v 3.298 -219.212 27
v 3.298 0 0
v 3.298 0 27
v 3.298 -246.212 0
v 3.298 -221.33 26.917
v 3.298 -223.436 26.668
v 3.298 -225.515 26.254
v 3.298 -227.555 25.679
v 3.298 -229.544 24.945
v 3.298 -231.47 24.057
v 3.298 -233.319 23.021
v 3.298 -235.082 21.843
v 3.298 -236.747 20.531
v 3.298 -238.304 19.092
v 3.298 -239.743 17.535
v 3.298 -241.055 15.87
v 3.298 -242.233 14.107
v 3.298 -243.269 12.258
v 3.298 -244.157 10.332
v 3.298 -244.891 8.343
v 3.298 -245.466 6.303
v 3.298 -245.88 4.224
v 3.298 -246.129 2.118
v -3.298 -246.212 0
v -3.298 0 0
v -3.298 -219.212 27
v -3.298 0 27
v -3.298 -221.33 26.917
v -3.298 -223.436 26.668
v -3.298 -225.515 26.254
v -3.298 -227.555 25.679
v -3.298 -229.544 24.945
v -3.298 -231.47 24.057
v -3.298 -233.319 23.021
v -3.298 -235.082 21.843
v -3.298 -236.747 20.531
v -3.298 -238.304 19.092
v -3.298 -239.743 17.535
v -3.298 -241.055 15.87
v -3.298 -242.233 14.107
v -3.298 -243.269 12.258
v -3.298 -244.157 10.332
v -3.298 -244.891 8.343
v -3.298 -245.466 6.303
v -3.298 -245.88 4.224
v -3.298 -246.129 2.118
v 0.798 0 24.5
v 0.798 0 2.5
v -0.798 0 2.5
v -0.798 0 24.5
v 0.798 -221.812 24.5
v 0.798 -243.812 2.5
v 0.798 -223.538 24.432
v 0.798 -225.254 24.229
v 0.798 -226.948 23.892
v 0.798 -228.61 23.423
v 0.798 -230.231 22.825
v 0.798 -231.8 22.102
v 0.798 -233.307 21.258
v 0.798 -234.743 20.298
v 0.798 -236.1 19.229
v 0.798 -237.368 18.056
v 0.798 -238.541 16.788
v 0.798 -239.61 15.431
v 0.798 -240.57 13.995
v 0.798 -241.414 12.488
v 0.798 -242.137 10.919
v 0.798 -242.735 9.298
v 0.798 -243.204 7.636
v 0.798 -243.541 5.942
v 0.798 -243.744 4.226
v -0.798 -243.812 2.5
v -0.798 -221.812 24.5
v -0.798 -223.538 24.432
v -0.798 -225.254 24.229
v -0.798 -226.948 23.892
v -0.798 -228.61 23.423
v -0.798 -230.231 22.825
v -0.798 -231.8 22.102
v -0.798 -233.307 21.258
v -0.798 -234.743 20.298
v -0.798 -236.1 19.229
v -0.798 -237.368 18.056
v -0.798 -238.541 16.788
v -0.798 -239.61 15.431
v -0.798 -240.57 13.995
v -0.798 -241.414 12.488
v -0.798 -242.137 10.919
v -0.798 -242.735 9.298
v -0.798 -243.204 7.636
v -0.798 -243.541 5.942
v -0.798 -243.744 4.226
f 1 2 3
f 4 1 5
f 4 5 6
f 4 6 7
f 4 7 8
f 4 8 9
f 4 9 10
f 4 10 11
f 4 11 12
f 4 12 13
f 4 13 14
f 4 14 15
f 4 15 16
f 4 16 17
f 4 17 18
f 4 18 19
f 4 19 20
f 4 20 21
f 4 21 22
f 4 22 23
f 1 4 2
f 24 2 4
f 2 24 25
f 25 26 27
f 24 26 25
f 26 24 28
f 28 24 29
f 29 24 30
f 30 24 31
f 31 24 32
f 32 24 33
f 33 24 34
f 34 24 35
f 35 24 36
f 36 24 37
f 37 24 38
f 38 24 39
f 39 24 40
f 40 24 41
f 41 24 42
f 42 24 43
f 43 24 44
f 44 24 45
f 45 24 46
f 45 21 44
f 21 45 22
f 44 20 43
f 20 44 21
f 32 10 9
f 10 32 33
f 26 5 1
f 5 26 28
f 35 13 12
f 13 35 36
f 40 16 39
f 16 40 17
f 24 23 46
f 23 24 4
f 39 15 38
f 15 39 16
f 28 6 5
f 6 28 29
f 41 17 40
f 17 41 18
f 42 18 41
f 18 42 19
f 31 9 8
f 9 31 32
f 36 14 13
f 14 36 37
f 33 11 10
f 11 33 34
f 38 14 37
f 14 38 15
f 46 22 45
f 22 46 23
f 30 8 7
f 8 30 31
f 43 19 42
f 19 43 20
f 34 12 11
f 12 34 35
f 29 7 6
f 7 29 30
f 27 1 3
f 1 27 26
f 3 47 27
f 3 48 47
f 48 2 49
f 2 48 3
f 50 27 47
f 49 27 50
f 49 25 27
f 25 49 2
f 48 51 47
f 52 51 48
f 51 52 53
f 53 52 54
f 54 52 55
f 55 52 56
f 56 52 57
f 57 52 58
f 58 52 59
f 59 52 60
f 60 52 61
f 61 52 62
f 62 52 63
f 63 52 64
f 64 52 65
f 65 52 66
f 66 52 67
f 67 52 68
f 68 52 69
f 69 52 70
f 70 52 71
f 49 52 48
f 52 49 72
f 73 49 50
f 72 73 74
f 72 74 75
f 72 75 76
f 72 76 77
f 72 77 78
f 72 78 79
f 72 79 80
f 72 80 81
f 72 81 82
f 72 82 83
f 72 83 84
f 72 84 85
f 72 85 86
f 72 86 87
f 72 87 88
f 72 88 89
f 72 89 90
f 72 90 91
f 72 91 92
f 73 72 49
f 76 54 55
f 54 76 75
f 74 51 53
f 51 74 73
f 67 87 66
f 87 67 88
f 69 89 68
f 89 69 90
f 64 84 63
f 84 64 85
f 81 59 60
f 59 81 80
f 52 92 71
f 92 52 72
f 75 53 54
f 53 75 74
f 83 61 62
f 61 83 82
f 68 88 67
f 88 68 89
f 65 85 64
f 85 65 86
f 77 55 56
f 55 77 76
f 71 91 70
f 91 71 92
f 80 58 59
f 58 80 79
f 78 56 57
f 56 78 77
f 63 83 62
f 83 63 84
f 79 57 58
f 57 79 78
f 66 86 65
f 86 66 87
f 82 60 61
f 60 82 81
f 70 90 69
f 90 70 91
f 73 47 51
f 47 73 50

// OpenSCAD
// parametric knife sheath
// original by Steve Pendergrast (vorpal)
// https://www.thingiverse.com/thing:125109
//
// remix v5.05 by BikeCyclist: Output rotated by 180 degrees to work around a suspected display bug in Thingiverse customizer - https://www.thingiverse.com/thing:4418138
// remix v5.04 by BikeCyclist: Default grip cutoff angle changed to something Thingiverse customizer can handle - https://www.thingiverse.com/thing:4418138
// remix v5.01 by BikeCyclist: Now supports negative grip cutoff angles 
// remix v4 by BikeCyclist: Bugfix for better walls with windows at high grip cutoff angles
// remix v3 by BikeCyclist: Bugfix (windows in thick walls) as suggested by Laurie, improved use of thingiverse customizer interface, better walls with windows at high grip cutoff angles
// remix v2 by BikeCyclist: Parametric wall thickness, shorter ridges, better symmetry
// remix v1 by BikeCyclist: Introducing holding ridge and oblique cut-off at grip
// https://www.thingiverse.com/thing:2856699

// length: the length of the blade from handle to tip
// maxwidth: the maximum width of the blade
// tipwidth:  the width near the tip, zero means it comes to a point
// thickness: maximum thickness of the blade
// has_windows:  0 = do not put in windows to show the blade and simplify cleaning
// has_ridges: 0 = do not add ridges to the sheath to hold the knife by friction
// grip_cutoff_angle:  the angle of the mouth of the sheet at the grip (off the vertical)
//

// Rule of thumb
// Make knife_length = length + 1 to 2mm
// Make knife_width = width + 1 to 2mm
// Make knife_thickness = length + .25mm

// all measurements are in mm

//CUSTOMIZER VARIABLES

//	Knife length, mm
knife_length = 241.712;	//	[25:350]

//	Knife Max Blade width, mm
knife_width = 20.0;	//	[10:100]

//	Knife thickness, mm
knife_thickness = 1.596;

//	Wall thickness, mm
wall_thickness = 1.25 ;

// Show knife through windows?
has_windows = 0; // [0:No, 1:Yes]

// Number of windows per side
number_of_windows = 10; // [1:25]

// Sheath has ridges to hold the knife more securely?
has_ridges = 0; // [0:No, 1:Yes]

// Angle of the sheath at the grip (0 = vertical) [-75:75]
grip_cutoff_angle = 0;

//CUSTOMIZER VARIABLES END

$fn = 80*1;  // while debugging reduce this to 20 to save time

wall = 2*wall_thickness;
pad = 2*1;

translate ([0, 0, knife_width + 2 * wall + pad])
    rotate ([0, 180, 180])
        parasheath (length = knife_length, maxwidth = knife_width, thickness = knife_thickness, windows = has_windows);


module parasheath(length=200, maxwidth=25, thickness=2, windows=1) 
{
    difference() 
    {
        union () 
        {            
            sheathwid = maxwidth + pad + 2 * wall;
            extralen = (grip_cutoff_angle<0?sheathwid * tan (-grip_cutoff_angle):0);
            sheathlen = length + wall + pad + extralen;

            translate ([0, -extralen, 0])
            difference() 
            {
                // first make an oversized blade, oversized by 2 times the wall thickness
                
                
                blade(len = sheathlen, maxwid = sheathwid, thick = thickness + 2 * wall);

                translate([0, 0, wall]) 
                blade(len = length + 0.1 + pad + extralen, maxwid = maxwidth + pad, thick = thickness);

            }
            
            if (has_ridges)
            for (i = [-1, 1])
                translate([0, 0, wall + knife_width/2 + pad/2]) 
                    translate ([i * knife_thickness/2, 0, 0])
                        rotate ([-90, 0, 0])
                            scale ([1, 2, 1])
                                cylinder (d = knife_thickness / 2, h = length/8);
            
        }
        
        if (windows)
            intersection ()
            {
                {
                    straight_length = length - maxwidth * sin (grip_cutoff_angle);
                    for (j = [-1, 1])
                        for (i = [1 : number_of_windows])
                            translate([j * (wall + thickness), maxwidth * sin (grip_cutoff_angle) + straight_length/number_of_windows * i + straight_length/(4 * number_of_windows) * j, maxwidth/2 + wall + pad/2]) 
                                    cube([2 * (wall + thickness), straight_length/(2 * number_of_windows), maxwidth + pad], center = true);
                }
                
                translate([0, 0, wall]) 
                    blade(len = length + 0.1 + pad - wall, maxwid = maxwidth + pad, thick = 2 * thickness + 4 * wall);
            }

        rotate ([-grip_cutoff_angle, 0, 0])
            translate([0, -1000, 0])
                    cube([2000,2000,2000], center=true);
    }
    
    /* Ensure windows don't cut through the mouth edges of the sheath */
    if (windows)
        difference ()
        {
            maxwid = maxwidth + pad + 2 * wall;
            
            hull ()
            {
                rotate ([-grip_cutoff_angle, 0, 0])
                    translate([0, 0, 0.5 * maxwid / cos (grip_cutoff_angle)])
                        cube ([thickness + 2 * wall, 0.01, maxwid / cos (grip_cutoff_angle)], center = true);
                
                translate([0, wall / cos (grip_cutoff_angle), 0])
                    rotate ([-grip_cutoff_angle, 0, 0])
                        translate([0, 0, 0.5 * maxwid / cos (grip_cutoff_angle)])
                            cube ([thickness + 2 * wall, 0.01, maxwid / cos (grip_cutoff_angle)], center = true);
            }
            
            hull ()
            {
                translate([0, -wall / cos (grip_cutoff_angle), 0])
                    rotate ([-grip_cutoff_angle, 0, 0])
                        translate([0, 0, 0.5 * maxwid / cos (grip_cutoff_angle)])
                            cube ([thickness, 0.01, (maxwidth + pad) / cos (grip_cutoff_angle)], center = true);
                
                translate([0, 2 * wall / cos (grip_cutoff_angle), 0])
                    rotate ([-grip_cutoff_angle, 0, 0])
                        translate([0, 0, 0.5 * maxwid / cos (grip_cutoff_angle)])
                            cube ([thickness, 0.01, (maxwidth + pad) / cos (grip_cutoff_angle)], center = true);
            }
        }
}

module blade (len = 200, maxwid = 25, tipwid = 5, thick = 2) 
{
    translate ([-thick/2, 0, 0])
        union() {
            intersection() {
                    // first make a cube
                    cube([thick, len, maxwid]);
        
                    translate([0,len-maxwid,maxwid]) 
                        rotate([0,90,0]) 
                            cylinder(r=maxwid,h=thick*3,center=true);
            }

            cube([thick,len-maxwid,maxwid]);
        }
}
